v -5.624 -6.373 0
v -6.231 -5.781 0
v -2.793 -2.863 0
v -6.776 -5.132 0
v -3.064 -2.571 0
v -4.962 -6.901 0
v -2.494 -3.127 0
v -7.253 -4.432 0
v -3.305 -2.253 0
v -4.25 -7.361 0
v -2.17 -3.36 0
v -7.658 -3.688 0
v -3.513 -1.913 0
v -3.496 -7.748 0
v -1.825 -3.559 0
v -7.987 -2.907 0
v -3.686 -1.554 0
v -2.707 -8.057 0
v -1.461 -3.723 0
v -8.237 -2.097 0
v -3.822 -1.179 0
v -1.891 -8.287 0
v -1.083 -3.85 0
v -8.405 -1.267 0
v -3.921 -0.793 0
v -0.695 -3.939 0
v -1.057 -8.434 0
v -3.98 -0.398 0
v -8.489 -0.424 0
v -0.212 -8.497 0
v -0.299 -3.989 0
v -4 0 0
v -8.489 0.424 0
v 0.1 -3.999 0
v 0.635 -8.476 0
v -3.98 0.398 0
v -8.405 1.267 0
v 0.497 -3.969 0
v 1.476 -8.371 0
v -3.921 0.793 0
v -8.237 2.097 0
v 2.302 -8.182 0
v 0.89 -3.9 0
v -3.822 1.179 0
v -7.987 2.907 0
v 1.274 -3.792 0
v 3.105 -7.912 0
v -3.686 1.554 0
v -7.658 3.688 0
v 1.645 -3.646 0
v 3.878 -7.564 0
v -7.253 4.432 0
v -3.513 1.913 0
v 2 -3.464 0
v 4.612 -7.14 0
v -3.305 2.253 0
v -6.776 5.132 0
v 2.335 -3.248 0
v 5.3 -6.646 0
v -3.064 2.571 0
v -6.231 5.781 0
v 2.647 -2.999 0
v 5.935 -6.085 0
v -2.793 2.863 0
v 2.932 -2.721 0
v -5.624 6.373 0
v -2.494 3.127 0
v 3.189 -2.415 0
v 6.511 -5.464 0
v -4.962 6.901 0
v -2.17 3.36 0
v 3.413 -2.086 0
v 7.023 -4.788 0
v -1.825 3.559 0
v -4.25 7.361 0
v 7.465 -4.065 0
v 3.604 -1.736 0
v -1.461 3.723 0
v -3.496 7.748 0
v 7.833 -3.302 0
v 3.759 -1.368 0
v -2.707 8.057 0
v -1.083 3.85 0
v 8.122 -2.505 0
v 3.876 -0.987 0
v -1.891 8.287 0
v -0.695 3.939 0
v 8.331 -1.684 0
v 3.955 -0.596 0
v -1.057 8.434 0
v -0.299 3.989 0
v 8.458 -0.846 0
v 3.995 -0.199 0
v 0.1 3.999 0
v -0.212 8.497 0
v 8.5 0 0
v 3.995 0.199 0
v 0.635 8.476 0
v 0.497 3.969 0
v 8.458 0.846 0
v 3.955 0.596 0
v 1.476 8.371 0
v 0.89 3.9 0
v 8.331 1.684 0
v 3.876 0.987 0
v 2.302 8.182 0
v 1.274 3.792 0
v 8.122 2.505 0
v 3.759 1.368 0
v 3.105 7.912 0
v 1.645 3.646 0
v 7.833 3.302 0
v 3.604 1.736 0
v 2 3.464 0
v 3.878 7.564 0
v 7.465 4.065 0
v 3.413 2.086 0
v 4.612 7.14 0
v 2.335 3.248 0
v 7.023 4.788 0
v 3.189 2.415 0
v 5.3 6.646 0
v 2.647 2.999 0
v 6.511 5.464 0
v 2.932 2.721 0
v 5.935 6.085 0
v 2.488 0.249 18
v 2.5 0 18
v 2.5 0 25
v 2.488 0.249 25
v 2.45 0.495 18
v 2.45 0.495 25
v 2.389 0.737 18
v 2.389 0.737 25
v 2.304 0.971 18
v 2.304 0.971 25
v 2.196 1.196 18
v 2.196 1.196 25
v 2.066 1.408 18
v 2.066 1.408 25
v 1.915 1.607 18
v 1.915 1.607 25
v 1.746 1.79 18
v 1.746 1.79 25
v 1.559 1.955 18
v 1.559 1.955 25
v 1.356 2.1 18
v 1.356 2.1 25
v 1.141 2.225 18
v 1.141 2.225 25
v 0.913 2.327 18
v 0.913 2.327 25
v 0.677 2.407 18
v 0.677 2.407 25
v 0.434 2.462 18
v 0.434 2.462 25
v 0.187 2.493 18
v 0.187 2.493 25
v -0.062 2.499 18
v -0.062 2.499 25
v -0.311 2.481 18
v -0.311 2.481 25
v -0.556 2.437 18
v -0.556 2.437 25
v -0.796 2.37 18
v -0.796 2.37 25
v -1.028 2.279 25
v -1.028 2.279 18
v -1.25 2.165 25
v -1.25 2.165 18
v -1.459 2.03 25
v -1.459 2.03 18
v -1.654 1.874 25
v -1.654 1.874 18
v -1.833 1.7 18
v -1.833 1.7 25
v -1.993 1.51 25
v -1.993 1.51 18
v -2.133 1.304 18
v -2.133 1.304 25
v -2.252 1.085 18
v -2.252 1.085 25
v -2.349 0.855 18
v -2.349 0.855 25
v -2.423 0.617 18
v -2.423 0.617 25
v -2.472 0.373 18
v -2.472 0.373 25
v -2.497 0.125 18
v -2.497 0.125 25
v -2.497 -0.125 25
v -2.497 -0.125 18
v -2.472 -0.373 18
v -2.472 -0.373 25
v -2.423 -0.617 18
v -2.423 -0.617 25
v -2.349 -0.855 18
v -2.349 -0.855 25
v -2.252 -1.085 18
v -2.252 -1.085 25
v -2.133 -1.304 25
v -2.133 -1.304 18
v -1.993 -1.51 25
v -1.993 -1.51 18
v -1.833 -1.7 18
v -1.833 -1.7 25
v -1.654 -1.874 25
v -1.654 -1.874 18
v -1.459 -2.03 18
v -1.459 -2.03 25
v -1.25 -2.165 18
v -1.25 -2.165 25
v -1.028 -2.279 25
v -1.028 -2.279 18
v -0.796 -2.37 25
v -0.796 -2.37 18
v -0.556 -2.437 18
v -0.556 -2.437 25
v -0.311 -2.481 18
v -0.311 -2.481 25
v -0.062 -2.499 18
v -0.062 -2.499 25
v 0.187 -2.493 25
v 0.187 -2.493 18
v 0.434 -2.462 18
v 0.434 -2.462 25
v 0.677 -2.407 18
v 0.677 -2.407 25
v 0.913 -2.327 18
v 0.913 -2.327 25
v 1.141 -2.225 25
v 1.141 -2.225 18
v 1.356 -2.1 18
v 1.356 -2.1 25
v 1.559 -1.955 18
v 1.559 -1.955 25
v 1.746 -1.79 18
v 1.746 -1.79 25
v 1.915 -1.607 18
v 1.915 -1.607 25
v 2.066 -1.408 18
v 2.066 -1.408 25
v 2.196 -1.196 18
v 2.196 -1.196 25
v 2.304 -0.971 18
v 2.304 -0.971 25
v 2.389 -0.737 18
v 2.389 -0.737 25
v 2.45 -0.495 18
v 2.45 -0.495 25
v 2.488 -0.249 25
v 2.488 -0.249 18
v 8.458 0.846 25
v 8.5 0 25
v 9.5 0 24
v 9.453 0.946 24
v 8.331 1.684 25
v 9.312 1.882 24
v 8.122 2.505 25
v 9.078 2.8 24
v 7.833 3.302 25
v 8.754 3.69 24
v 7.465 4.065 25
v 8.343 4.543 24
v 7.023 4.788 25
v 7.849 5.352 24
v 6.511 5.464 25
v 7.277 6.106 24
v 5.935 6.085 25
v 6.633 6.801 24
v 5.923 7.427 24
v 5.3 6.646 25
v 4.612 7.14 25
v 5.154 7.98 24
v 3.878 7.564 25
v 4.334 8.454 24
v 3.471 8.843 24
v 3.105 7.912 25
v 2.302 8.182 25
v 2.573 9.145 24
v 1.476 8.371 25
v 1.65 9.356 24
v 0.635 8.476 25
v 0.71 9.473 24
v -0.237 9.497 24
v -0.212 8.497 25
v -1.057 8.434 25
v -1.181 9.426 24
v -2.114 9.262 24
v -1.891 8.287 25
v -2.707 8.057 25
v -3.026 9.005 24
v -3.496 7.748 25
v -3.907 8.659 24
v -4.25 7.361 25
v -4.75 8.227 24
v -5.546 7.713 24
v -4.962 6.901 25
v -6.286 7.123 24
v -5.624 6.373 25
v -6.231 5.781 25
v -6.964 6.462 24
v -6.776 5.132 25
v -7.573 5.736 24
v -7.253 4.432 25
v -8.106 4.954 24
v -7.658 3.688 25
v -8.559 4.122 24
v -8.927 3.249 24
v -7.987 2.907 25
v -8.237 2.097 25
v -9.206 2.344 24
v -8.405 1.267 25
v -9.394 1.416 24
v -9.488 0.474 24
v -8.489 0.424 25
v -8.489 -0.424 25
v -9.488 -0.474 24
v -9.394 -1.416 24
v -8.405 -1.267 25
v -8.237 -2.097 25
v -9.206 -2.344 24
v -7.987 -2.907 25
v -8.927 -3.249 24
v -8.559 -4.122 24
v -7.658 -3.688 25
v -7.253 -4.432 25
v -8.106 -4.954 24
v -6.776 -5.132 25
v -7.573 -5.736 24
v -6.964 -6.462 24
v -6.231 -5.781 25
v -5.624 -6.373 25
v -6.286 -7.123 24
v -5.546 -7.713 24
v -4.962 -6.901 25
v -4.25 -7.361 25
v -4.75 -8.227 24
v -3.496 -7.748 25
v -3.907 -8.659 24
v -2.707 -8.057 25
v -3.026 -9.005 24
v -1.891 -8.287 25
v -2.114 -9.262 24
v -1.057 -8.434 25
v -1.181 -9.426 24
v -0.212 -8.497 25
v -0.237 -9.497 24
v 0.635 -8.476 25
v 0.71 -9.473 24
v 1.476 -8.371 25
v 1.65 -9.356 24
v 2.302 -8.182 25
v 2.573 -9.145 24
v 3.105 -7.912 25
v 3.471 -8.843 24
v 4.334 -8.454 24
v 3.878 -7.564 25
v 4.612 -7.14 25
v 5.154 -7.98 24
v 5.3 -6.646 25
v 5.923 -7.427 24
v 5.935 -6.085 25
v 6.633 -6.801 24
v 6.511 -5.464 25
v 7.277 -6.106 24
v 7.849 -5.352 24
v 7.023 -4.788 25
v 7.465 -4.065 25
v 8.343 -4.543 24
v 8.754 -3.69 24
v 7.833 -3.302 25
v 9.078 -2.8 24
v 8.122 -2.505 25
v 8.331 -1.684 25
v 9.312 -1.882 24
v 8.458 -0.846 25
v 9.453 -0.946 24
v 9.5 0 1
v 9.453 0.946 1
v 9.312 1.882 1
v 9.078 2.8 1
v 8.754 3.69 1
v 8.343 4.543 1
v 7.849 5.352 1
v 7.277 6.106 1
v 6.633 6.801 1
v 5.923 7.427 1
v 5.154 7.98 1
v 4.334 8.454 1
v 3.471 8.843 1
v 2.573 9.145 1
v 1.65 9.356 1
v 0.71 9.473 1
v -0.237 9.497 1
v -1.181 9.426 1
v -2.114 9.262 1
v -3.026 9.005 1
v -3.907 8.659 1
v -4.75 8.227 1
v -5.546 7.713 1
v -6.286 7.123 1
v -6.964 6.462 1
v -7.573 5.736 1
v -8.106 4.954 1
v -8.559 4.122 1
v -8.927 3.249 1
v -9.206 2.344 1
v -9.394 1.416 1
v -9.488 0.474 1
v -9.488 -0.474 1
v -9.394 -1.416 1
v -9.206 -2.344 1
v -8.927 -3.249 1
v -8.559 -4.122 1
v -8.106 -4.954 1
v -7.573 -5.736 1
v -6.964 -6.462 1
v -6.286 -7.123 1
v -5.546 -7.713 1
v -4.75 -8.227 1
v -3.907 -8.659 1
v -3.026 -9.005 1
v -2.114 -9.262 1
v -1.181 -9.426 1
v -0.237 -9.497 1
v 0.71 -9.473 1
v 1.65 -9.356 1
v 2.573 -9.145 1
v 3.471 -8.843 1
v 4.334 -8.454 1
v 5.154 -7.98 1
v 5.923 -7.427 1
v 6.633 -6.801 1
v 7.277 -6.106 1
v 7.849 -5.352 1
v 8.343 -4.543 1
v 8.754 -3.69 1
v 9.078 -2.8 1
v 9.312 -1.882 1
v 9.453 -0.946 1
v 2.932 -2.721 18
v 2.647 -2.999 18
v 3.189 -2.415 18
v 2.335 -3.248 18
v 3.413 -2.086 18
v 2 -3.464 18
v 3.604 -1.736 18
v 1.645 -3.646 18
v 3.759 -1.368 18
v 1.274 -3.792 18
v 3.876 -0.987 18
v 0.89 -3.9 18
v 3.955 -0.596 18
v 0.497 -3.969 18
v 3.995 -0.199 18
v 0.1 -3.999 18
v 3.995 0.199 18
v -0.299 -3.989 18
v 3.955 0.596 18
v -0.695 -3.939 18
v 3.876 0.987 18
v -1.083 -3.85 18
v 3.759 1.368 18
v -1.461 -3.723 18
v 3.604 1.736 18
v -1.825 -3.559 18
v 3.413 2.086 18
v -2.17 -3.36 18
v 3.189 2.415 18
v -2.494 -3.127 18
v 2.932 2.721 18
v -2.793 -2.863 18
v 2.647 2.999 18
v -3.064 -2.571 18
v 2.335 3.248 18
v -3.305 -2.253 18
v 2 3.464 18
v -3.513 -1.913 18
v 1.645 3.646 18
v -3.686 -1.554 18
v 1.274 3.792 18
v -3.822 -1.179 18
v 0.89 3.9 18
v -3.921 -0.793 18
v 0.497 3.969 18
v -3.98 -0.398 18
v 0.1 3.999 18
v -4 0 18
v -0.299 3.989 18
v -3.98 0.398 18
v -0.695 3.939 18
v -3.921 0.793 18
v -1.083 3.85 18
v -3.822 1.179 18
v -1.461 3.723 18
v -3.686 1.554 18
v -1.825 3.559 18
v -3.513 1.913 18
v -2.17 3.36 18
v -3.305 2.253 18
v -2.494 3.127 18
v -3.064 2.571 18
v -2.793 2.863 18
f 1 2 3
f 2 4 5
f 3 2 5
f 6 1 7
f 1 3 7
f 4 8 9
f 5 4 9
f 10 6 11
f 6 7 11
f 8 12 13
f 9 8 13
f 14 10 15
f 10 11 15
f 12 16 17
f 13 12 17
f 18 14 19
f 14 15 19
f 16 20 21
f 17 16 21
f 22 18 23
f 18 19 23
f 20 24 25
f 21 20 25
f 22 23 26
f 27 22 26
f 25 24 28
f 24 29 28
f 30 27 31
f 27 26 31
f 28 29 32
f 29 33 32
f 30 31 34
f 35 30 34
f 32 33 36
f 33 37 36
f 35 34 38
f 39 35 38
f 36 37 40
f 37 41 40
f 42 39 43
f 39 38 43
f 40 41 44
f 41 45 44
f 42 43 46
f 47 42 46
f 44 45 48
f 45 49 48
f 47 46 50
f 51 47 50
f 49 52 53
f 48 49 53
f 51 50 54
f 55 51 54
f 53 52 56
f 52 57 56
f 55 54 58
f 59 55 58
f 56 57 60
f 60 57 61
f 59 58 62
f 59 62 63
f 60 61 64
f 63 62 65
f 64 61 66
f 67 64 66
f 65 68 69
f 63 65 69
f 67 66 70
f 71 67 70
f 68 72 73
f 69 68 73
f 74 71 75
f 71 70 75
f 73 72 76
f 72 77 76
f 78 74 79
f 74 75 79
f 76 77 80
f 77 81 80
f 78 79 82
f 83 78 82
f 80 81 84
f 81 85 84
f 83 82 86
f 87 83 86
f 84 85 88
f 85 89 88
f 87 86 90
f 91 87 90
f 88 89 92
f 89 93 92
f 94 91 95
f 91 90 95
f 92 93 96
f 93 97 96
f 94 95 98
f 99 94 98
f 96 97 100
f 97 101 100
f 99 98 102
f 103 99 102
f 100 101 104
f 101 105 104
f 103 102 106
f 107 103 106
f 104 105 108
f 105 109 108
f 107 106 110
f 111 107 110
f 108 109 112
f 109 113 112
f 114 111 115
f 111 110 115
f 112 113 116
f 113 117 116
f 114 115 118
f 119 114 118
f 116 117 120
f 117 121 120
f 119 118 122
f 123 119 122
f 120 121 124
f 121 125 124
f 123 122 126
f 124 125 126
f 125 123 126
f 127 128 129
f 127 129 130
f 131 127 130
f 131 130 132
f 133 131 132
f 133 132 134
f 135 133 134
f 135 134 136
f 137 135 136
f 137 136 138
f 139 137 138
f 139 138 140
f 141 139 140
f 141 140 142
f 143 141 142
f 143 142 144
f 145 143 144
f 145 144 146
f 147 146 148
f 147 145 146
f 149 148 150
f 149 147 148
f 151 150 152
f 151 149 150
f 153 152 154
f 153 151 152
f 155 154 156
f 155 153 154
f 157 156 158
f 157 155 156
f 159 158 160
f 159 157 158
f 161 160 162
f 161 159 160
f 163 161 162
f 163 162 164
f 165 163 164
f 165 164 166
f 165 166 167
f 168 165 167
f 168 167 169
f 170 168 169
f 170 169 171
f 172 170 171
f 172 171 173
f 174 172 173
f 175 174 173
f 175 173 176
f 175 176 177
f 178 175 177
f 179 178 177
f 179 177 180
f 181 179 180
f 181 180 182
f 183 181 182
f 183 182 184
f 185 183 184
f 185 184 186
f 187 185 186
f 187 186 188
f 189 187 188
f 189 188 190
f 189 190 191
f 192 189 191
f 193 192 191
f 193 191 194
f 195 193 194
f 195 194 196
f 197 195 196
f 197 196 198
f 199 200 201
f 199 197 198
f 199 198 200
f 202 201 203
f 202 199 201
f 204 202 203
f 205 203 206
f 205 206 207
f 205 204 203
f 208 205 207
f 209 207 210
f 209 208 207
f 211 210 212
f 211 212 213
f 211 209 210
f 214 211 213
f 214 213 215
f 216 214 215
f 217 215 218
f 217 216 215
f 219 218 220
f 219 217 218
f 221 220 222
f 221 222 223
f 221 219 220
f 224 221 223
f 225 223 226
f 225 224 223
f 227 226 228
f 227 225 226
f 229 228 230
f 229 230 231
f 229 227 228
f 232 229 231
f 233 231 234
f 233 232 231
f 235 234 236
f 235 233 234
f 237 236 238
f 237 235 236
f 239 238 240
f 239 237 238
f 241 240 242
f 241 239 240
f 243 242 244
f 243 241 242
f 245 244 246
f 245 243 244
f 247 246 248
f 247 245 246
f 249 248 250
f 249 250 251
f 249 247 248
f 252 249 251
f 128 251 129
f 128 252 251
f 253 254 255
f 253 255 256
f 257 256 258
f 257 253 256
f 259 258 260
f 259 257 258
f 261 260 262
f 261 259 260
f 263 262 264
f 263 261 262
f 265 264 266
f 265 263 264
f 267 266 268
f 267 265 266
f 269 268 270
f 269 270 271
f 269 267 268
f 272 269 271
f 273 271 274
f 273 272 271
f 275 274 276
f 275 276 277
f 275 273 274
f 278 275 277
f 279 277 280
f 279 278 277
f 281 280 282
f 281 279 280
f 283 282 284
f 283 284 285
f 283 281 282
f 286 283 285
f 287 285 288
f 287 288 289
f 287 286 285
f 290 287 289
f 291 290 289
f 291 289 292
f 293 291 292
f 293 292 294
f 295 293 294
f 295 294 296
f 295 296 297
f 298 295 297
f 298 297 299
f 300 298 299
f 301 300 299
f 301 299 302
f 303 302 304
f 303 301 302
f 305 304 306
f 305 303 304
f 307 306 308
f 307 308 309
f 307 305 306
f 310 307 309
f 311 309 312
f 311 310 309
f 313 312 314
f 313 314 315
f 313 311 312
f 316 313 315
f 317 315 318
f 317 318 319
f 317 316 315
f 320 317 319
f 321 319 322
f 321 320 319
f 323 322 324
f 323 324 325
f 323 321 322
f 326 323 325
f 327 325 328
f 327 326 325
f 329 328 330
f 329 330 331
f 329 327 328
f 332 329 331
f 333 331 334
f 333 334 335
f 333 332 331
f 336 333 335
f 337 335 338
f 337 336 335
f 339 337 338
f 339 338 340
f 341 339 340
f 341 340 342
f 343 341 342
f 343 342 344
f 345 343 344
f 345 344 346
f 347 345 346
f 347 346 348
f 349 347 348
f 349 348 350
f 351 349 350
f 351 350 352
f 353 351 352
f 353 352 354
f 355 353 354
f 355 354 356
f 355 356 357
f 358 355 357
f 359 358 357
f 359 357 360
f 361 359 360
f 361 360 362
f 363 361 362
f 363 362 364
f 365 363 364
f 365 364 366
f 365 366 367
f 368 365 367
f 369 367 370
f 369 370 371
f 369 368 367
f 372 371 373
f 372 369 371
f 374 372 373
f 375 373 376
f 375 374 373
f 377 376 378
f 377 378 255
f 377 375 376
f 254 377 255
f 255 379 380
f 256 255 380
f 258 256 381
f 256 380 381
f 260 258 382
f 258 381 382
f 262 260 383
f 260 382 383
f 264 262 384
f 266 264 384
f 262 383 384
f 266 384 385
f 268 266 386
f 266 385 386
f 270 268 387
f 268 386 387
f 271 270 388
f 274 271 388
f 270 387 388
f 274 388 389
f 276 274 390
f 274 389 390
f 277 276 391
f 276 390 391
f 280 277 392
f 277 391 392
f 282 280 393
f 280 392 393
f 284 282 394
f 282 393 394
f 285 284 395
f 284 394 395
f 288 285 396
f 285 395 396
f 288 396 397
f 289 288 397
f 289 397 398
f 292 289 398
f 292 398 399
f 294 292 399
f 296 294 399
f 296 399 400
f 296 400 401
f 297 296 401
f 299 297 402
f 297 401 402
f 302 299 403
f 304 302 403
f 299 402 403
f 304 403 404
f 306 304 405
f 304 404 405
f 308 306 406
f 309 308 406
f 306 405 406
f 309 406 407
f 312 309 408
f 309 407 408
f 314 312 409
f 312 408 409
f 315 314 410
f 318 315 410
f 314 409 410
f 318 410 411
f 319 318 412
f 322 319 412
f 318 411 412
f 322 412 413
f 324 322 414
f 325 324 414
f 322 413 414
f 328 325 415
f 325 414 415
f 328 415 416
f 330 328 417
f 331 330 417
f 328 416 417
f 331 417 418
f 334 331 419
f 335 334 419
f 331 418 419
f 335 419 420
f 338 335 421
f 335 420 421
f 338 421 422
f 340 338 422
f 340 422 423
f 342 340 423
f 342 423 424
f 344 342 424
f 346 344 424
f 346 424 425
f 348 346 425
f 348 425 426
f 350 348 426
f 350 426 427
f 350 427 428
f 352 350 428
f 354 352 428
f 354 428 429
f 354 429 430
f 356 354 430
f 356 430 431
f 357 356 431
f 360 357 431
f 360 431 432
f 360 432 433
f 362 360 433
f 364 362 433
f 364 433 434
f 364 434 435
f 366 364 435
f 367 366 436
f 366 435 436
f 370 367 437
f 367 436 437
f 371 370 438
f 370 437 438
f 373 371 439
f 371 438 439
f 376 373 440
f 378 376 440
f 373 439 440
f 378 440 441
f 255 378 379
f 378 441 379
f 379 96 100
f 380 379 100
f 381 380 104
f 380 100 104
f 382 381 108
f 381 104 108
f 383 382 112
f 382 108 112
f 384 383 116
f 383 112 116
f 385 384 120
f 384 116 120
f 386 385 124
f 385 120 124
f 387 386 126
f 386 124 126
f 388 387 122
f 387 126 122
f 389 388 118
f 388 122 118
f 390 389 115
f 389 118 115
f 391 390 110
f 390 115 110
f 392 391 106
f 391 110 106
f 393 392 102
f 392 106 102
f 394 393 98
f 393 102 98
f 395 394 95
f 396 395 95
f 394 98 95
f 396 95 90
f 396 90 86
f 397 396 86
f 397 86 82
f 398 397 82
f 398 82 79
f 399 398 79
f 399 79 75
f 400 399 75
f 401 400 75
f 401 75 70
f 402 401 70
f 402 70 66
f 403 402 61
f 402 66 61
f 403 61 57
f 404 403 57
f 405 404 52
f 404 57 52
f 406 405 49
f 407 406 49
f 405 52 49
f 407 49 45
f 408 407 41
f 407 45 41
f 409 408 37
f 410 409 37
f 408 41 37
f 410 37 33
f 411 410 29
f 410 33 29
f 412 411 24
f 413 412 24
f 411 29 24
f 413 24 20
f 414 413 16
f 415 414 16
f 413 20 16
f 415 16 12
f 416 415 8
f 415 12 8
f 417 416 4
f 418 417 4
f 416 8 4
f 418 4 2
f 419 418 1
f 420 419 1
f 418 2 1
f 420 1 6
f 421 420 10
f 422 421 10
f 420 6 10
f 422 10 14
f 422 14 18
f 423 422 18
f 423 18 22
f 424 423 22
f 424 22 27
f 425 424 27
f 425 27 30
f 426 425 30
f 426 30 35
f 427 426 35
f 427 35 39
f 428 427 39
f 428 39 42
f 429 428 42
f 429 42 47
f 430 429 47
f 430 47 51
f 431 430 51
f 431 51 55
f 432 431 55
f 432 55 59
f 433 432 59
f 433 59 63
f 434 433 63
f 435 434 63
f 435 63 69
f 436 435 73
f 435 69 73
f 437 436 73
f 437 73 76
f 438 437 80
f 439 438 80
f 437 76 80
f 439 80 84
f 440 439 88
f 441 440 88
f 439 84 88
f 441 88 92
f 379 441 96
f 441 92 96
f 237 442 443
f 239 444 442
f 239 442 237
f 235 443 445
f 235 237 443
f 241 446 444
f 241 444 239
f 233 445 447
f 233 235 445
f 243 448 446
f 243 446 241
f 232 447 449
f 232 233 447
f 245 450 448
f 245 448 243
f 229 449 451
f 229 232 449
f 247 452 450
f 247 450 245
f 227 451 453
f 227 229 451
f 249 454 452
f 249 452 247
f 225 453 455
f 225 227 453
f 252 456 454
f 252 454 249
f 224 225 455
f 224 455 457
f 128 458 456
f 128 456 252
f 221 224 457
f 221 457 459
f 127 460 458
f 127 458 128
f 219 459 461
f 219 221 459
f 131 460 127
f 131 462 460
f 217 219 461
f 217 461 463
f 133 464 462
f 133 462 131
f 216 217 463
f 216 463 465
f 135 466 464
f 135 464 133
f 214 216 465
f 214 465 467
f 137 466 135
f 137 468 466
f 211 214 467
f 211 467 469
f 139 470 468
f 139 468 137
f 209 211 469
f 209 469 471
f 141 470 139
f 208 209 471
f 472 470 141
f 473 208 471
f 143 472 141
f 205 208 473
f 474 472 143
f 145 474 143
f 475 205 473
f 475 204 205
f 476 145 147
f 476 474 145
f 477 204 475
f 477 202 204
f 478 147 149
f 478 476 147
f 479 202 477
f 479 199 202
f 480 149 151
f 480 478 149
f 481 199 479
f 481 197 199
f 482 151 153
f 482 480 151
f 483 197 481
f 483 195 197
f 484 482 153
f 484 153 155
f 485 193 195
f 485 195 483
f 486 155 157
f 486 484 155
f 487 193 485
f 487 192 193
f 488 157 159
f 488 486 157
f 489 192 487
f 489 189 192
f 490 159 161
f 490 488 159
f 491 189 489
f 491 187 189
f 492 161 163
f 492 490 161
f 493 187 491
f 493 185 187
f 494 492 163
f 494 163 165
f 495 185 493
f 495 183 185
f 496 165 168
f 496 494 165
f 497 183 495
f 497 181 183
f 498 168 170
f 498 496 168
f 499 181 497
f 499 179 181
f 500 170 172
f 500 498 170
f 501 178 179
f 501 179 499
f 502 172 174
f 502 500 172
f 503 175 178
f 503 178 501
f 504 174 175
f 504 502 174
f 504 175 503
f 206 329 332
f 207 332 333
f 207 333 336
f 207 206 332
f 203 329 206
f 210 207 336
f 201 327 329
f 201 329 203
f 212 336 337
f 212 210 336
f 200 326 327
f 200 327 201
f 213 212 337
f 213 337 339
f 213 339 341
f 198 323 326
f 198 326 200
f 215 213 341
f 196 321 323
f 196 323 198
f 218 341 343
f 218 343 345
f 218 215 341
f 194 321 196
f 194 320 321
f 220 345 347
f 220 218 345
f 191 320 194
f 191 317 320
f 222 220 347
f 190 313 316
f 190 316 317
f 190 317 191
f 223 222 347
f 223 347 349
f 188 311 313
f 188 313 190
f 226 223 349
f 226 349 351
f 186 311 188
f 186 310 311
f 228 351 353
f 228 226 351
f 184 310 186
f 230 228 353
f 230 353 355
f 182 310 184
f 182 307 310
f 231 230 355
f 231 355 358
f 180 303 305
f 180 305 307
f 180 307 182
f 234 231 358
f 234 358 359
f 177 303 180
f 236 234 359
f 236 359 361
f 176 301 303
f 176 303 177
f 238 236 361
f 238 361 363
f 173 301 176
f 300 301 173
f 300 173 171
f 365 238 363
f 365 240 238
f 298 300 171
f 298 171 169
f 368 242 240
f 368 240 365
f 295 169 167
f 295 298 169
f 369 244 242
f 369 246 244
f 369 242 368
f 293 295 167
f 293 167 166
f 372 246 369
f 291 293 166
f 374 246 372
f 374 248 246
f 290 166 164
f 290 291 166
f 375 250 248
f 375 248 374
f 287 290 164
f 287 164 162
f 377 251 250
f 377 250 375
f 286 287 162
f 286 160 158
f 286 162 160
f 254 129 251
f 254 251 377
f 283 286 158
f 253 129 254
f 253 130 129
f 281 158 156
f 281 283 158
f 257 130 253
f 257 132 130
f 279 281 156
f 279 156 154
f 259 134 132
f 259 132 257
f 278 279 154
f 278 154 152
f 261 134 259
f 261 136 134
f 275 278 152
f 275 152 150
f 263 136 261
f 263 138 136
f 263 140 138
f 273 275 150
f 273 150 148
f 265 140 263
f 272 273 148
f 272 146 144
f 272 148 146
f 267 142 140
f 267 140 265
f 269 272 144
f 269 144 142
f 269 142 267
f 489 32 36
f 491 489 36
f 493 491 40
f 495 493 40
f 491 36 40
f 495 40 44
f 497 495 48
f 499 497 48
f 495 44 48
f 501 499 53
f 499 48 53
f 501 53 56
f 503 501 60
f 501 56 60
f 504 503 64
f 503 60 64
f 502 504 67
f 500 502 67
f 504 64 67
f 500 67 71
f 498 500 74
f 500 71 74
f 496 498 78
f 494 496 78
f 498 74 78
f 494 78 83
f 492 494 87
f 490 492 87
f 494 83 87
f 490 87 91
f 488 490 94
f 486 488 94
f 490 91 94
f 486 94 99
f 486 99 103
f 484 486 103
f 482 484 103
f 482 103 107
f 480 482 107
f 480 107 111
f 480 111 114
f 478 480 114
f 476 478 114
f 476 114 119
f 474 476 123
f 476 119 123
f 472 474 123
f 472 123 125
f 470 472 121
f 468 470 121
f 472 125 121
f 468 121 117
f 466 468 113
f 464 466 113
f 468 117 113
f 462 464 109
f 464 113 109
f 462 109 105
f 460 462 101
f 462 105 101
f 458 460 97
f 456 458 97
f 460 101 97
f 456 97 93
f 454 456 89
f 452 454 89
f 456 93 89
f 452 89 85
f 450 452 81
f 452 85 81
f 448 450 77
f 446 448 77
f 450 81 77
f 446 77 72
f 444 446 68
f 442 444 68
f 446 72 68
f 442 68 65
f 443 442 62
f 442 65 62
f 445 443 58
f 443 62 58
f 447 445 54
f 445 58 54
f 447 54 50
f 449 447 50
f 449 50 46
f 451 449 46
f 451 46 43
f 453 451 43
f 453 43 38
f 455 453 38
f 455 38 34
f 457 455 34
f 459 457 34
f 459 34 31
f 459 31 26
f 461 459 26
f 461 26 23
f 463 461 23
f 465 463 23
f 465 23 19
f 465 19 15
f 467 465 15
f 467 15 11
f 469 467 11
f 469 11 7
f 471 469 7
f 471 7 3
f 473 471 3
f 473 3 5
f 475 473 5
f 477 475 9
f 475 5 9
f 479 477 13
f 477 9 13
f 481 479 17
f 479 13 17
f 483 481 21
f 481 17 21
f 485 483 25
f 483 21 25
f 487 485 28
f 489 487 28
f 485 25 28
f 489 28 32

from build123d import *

# Parameters (mm, degrees)
SKETCH_1_R          = 9.5
SKETCH_1_R_2        = 2.5
EXTRUDE_1_DEPTH     = 25
CHAMFER_1_SIZE      = 1
SKETCH_2_R          = 4
CUT_EXTRUDE_1_DEPTH = 18


with BuildPart() as part:
    # 草图1 → 凸台-拉伸1 (new body)
    with BuildSketch(Plane.XY):
        Circle(SKETCH_1_R)
        Circle(SKETCH_1_R_2, mode=Mode.SUBTRACT)
    extrude(amount=EXTRUDE_1_DEPTH)

    # 倒角1
    chamfer_1_edges = [part.edges().sort_by_distance(p)[0] for p in [
        (-9.5, 0, 0),
        (-9.5, 0, 25),
    ]]
    chamfer(chamfer_1_edges, length=CHAMFER_1_SIZE)

    # 草图2 → 切除-拉伸1 (cut)
    with BuildSketch(Plane(origin=(0, 0, 0), x_dir=(-1, 0, 0), z_dir=(0, 0, -1))):
        Circle(SKETCH_2_R)
    extrude(amount=-CUT_EXTRUDE_1_DEPTH, mode=Mode.SUBTRACT)


solid = part.part
